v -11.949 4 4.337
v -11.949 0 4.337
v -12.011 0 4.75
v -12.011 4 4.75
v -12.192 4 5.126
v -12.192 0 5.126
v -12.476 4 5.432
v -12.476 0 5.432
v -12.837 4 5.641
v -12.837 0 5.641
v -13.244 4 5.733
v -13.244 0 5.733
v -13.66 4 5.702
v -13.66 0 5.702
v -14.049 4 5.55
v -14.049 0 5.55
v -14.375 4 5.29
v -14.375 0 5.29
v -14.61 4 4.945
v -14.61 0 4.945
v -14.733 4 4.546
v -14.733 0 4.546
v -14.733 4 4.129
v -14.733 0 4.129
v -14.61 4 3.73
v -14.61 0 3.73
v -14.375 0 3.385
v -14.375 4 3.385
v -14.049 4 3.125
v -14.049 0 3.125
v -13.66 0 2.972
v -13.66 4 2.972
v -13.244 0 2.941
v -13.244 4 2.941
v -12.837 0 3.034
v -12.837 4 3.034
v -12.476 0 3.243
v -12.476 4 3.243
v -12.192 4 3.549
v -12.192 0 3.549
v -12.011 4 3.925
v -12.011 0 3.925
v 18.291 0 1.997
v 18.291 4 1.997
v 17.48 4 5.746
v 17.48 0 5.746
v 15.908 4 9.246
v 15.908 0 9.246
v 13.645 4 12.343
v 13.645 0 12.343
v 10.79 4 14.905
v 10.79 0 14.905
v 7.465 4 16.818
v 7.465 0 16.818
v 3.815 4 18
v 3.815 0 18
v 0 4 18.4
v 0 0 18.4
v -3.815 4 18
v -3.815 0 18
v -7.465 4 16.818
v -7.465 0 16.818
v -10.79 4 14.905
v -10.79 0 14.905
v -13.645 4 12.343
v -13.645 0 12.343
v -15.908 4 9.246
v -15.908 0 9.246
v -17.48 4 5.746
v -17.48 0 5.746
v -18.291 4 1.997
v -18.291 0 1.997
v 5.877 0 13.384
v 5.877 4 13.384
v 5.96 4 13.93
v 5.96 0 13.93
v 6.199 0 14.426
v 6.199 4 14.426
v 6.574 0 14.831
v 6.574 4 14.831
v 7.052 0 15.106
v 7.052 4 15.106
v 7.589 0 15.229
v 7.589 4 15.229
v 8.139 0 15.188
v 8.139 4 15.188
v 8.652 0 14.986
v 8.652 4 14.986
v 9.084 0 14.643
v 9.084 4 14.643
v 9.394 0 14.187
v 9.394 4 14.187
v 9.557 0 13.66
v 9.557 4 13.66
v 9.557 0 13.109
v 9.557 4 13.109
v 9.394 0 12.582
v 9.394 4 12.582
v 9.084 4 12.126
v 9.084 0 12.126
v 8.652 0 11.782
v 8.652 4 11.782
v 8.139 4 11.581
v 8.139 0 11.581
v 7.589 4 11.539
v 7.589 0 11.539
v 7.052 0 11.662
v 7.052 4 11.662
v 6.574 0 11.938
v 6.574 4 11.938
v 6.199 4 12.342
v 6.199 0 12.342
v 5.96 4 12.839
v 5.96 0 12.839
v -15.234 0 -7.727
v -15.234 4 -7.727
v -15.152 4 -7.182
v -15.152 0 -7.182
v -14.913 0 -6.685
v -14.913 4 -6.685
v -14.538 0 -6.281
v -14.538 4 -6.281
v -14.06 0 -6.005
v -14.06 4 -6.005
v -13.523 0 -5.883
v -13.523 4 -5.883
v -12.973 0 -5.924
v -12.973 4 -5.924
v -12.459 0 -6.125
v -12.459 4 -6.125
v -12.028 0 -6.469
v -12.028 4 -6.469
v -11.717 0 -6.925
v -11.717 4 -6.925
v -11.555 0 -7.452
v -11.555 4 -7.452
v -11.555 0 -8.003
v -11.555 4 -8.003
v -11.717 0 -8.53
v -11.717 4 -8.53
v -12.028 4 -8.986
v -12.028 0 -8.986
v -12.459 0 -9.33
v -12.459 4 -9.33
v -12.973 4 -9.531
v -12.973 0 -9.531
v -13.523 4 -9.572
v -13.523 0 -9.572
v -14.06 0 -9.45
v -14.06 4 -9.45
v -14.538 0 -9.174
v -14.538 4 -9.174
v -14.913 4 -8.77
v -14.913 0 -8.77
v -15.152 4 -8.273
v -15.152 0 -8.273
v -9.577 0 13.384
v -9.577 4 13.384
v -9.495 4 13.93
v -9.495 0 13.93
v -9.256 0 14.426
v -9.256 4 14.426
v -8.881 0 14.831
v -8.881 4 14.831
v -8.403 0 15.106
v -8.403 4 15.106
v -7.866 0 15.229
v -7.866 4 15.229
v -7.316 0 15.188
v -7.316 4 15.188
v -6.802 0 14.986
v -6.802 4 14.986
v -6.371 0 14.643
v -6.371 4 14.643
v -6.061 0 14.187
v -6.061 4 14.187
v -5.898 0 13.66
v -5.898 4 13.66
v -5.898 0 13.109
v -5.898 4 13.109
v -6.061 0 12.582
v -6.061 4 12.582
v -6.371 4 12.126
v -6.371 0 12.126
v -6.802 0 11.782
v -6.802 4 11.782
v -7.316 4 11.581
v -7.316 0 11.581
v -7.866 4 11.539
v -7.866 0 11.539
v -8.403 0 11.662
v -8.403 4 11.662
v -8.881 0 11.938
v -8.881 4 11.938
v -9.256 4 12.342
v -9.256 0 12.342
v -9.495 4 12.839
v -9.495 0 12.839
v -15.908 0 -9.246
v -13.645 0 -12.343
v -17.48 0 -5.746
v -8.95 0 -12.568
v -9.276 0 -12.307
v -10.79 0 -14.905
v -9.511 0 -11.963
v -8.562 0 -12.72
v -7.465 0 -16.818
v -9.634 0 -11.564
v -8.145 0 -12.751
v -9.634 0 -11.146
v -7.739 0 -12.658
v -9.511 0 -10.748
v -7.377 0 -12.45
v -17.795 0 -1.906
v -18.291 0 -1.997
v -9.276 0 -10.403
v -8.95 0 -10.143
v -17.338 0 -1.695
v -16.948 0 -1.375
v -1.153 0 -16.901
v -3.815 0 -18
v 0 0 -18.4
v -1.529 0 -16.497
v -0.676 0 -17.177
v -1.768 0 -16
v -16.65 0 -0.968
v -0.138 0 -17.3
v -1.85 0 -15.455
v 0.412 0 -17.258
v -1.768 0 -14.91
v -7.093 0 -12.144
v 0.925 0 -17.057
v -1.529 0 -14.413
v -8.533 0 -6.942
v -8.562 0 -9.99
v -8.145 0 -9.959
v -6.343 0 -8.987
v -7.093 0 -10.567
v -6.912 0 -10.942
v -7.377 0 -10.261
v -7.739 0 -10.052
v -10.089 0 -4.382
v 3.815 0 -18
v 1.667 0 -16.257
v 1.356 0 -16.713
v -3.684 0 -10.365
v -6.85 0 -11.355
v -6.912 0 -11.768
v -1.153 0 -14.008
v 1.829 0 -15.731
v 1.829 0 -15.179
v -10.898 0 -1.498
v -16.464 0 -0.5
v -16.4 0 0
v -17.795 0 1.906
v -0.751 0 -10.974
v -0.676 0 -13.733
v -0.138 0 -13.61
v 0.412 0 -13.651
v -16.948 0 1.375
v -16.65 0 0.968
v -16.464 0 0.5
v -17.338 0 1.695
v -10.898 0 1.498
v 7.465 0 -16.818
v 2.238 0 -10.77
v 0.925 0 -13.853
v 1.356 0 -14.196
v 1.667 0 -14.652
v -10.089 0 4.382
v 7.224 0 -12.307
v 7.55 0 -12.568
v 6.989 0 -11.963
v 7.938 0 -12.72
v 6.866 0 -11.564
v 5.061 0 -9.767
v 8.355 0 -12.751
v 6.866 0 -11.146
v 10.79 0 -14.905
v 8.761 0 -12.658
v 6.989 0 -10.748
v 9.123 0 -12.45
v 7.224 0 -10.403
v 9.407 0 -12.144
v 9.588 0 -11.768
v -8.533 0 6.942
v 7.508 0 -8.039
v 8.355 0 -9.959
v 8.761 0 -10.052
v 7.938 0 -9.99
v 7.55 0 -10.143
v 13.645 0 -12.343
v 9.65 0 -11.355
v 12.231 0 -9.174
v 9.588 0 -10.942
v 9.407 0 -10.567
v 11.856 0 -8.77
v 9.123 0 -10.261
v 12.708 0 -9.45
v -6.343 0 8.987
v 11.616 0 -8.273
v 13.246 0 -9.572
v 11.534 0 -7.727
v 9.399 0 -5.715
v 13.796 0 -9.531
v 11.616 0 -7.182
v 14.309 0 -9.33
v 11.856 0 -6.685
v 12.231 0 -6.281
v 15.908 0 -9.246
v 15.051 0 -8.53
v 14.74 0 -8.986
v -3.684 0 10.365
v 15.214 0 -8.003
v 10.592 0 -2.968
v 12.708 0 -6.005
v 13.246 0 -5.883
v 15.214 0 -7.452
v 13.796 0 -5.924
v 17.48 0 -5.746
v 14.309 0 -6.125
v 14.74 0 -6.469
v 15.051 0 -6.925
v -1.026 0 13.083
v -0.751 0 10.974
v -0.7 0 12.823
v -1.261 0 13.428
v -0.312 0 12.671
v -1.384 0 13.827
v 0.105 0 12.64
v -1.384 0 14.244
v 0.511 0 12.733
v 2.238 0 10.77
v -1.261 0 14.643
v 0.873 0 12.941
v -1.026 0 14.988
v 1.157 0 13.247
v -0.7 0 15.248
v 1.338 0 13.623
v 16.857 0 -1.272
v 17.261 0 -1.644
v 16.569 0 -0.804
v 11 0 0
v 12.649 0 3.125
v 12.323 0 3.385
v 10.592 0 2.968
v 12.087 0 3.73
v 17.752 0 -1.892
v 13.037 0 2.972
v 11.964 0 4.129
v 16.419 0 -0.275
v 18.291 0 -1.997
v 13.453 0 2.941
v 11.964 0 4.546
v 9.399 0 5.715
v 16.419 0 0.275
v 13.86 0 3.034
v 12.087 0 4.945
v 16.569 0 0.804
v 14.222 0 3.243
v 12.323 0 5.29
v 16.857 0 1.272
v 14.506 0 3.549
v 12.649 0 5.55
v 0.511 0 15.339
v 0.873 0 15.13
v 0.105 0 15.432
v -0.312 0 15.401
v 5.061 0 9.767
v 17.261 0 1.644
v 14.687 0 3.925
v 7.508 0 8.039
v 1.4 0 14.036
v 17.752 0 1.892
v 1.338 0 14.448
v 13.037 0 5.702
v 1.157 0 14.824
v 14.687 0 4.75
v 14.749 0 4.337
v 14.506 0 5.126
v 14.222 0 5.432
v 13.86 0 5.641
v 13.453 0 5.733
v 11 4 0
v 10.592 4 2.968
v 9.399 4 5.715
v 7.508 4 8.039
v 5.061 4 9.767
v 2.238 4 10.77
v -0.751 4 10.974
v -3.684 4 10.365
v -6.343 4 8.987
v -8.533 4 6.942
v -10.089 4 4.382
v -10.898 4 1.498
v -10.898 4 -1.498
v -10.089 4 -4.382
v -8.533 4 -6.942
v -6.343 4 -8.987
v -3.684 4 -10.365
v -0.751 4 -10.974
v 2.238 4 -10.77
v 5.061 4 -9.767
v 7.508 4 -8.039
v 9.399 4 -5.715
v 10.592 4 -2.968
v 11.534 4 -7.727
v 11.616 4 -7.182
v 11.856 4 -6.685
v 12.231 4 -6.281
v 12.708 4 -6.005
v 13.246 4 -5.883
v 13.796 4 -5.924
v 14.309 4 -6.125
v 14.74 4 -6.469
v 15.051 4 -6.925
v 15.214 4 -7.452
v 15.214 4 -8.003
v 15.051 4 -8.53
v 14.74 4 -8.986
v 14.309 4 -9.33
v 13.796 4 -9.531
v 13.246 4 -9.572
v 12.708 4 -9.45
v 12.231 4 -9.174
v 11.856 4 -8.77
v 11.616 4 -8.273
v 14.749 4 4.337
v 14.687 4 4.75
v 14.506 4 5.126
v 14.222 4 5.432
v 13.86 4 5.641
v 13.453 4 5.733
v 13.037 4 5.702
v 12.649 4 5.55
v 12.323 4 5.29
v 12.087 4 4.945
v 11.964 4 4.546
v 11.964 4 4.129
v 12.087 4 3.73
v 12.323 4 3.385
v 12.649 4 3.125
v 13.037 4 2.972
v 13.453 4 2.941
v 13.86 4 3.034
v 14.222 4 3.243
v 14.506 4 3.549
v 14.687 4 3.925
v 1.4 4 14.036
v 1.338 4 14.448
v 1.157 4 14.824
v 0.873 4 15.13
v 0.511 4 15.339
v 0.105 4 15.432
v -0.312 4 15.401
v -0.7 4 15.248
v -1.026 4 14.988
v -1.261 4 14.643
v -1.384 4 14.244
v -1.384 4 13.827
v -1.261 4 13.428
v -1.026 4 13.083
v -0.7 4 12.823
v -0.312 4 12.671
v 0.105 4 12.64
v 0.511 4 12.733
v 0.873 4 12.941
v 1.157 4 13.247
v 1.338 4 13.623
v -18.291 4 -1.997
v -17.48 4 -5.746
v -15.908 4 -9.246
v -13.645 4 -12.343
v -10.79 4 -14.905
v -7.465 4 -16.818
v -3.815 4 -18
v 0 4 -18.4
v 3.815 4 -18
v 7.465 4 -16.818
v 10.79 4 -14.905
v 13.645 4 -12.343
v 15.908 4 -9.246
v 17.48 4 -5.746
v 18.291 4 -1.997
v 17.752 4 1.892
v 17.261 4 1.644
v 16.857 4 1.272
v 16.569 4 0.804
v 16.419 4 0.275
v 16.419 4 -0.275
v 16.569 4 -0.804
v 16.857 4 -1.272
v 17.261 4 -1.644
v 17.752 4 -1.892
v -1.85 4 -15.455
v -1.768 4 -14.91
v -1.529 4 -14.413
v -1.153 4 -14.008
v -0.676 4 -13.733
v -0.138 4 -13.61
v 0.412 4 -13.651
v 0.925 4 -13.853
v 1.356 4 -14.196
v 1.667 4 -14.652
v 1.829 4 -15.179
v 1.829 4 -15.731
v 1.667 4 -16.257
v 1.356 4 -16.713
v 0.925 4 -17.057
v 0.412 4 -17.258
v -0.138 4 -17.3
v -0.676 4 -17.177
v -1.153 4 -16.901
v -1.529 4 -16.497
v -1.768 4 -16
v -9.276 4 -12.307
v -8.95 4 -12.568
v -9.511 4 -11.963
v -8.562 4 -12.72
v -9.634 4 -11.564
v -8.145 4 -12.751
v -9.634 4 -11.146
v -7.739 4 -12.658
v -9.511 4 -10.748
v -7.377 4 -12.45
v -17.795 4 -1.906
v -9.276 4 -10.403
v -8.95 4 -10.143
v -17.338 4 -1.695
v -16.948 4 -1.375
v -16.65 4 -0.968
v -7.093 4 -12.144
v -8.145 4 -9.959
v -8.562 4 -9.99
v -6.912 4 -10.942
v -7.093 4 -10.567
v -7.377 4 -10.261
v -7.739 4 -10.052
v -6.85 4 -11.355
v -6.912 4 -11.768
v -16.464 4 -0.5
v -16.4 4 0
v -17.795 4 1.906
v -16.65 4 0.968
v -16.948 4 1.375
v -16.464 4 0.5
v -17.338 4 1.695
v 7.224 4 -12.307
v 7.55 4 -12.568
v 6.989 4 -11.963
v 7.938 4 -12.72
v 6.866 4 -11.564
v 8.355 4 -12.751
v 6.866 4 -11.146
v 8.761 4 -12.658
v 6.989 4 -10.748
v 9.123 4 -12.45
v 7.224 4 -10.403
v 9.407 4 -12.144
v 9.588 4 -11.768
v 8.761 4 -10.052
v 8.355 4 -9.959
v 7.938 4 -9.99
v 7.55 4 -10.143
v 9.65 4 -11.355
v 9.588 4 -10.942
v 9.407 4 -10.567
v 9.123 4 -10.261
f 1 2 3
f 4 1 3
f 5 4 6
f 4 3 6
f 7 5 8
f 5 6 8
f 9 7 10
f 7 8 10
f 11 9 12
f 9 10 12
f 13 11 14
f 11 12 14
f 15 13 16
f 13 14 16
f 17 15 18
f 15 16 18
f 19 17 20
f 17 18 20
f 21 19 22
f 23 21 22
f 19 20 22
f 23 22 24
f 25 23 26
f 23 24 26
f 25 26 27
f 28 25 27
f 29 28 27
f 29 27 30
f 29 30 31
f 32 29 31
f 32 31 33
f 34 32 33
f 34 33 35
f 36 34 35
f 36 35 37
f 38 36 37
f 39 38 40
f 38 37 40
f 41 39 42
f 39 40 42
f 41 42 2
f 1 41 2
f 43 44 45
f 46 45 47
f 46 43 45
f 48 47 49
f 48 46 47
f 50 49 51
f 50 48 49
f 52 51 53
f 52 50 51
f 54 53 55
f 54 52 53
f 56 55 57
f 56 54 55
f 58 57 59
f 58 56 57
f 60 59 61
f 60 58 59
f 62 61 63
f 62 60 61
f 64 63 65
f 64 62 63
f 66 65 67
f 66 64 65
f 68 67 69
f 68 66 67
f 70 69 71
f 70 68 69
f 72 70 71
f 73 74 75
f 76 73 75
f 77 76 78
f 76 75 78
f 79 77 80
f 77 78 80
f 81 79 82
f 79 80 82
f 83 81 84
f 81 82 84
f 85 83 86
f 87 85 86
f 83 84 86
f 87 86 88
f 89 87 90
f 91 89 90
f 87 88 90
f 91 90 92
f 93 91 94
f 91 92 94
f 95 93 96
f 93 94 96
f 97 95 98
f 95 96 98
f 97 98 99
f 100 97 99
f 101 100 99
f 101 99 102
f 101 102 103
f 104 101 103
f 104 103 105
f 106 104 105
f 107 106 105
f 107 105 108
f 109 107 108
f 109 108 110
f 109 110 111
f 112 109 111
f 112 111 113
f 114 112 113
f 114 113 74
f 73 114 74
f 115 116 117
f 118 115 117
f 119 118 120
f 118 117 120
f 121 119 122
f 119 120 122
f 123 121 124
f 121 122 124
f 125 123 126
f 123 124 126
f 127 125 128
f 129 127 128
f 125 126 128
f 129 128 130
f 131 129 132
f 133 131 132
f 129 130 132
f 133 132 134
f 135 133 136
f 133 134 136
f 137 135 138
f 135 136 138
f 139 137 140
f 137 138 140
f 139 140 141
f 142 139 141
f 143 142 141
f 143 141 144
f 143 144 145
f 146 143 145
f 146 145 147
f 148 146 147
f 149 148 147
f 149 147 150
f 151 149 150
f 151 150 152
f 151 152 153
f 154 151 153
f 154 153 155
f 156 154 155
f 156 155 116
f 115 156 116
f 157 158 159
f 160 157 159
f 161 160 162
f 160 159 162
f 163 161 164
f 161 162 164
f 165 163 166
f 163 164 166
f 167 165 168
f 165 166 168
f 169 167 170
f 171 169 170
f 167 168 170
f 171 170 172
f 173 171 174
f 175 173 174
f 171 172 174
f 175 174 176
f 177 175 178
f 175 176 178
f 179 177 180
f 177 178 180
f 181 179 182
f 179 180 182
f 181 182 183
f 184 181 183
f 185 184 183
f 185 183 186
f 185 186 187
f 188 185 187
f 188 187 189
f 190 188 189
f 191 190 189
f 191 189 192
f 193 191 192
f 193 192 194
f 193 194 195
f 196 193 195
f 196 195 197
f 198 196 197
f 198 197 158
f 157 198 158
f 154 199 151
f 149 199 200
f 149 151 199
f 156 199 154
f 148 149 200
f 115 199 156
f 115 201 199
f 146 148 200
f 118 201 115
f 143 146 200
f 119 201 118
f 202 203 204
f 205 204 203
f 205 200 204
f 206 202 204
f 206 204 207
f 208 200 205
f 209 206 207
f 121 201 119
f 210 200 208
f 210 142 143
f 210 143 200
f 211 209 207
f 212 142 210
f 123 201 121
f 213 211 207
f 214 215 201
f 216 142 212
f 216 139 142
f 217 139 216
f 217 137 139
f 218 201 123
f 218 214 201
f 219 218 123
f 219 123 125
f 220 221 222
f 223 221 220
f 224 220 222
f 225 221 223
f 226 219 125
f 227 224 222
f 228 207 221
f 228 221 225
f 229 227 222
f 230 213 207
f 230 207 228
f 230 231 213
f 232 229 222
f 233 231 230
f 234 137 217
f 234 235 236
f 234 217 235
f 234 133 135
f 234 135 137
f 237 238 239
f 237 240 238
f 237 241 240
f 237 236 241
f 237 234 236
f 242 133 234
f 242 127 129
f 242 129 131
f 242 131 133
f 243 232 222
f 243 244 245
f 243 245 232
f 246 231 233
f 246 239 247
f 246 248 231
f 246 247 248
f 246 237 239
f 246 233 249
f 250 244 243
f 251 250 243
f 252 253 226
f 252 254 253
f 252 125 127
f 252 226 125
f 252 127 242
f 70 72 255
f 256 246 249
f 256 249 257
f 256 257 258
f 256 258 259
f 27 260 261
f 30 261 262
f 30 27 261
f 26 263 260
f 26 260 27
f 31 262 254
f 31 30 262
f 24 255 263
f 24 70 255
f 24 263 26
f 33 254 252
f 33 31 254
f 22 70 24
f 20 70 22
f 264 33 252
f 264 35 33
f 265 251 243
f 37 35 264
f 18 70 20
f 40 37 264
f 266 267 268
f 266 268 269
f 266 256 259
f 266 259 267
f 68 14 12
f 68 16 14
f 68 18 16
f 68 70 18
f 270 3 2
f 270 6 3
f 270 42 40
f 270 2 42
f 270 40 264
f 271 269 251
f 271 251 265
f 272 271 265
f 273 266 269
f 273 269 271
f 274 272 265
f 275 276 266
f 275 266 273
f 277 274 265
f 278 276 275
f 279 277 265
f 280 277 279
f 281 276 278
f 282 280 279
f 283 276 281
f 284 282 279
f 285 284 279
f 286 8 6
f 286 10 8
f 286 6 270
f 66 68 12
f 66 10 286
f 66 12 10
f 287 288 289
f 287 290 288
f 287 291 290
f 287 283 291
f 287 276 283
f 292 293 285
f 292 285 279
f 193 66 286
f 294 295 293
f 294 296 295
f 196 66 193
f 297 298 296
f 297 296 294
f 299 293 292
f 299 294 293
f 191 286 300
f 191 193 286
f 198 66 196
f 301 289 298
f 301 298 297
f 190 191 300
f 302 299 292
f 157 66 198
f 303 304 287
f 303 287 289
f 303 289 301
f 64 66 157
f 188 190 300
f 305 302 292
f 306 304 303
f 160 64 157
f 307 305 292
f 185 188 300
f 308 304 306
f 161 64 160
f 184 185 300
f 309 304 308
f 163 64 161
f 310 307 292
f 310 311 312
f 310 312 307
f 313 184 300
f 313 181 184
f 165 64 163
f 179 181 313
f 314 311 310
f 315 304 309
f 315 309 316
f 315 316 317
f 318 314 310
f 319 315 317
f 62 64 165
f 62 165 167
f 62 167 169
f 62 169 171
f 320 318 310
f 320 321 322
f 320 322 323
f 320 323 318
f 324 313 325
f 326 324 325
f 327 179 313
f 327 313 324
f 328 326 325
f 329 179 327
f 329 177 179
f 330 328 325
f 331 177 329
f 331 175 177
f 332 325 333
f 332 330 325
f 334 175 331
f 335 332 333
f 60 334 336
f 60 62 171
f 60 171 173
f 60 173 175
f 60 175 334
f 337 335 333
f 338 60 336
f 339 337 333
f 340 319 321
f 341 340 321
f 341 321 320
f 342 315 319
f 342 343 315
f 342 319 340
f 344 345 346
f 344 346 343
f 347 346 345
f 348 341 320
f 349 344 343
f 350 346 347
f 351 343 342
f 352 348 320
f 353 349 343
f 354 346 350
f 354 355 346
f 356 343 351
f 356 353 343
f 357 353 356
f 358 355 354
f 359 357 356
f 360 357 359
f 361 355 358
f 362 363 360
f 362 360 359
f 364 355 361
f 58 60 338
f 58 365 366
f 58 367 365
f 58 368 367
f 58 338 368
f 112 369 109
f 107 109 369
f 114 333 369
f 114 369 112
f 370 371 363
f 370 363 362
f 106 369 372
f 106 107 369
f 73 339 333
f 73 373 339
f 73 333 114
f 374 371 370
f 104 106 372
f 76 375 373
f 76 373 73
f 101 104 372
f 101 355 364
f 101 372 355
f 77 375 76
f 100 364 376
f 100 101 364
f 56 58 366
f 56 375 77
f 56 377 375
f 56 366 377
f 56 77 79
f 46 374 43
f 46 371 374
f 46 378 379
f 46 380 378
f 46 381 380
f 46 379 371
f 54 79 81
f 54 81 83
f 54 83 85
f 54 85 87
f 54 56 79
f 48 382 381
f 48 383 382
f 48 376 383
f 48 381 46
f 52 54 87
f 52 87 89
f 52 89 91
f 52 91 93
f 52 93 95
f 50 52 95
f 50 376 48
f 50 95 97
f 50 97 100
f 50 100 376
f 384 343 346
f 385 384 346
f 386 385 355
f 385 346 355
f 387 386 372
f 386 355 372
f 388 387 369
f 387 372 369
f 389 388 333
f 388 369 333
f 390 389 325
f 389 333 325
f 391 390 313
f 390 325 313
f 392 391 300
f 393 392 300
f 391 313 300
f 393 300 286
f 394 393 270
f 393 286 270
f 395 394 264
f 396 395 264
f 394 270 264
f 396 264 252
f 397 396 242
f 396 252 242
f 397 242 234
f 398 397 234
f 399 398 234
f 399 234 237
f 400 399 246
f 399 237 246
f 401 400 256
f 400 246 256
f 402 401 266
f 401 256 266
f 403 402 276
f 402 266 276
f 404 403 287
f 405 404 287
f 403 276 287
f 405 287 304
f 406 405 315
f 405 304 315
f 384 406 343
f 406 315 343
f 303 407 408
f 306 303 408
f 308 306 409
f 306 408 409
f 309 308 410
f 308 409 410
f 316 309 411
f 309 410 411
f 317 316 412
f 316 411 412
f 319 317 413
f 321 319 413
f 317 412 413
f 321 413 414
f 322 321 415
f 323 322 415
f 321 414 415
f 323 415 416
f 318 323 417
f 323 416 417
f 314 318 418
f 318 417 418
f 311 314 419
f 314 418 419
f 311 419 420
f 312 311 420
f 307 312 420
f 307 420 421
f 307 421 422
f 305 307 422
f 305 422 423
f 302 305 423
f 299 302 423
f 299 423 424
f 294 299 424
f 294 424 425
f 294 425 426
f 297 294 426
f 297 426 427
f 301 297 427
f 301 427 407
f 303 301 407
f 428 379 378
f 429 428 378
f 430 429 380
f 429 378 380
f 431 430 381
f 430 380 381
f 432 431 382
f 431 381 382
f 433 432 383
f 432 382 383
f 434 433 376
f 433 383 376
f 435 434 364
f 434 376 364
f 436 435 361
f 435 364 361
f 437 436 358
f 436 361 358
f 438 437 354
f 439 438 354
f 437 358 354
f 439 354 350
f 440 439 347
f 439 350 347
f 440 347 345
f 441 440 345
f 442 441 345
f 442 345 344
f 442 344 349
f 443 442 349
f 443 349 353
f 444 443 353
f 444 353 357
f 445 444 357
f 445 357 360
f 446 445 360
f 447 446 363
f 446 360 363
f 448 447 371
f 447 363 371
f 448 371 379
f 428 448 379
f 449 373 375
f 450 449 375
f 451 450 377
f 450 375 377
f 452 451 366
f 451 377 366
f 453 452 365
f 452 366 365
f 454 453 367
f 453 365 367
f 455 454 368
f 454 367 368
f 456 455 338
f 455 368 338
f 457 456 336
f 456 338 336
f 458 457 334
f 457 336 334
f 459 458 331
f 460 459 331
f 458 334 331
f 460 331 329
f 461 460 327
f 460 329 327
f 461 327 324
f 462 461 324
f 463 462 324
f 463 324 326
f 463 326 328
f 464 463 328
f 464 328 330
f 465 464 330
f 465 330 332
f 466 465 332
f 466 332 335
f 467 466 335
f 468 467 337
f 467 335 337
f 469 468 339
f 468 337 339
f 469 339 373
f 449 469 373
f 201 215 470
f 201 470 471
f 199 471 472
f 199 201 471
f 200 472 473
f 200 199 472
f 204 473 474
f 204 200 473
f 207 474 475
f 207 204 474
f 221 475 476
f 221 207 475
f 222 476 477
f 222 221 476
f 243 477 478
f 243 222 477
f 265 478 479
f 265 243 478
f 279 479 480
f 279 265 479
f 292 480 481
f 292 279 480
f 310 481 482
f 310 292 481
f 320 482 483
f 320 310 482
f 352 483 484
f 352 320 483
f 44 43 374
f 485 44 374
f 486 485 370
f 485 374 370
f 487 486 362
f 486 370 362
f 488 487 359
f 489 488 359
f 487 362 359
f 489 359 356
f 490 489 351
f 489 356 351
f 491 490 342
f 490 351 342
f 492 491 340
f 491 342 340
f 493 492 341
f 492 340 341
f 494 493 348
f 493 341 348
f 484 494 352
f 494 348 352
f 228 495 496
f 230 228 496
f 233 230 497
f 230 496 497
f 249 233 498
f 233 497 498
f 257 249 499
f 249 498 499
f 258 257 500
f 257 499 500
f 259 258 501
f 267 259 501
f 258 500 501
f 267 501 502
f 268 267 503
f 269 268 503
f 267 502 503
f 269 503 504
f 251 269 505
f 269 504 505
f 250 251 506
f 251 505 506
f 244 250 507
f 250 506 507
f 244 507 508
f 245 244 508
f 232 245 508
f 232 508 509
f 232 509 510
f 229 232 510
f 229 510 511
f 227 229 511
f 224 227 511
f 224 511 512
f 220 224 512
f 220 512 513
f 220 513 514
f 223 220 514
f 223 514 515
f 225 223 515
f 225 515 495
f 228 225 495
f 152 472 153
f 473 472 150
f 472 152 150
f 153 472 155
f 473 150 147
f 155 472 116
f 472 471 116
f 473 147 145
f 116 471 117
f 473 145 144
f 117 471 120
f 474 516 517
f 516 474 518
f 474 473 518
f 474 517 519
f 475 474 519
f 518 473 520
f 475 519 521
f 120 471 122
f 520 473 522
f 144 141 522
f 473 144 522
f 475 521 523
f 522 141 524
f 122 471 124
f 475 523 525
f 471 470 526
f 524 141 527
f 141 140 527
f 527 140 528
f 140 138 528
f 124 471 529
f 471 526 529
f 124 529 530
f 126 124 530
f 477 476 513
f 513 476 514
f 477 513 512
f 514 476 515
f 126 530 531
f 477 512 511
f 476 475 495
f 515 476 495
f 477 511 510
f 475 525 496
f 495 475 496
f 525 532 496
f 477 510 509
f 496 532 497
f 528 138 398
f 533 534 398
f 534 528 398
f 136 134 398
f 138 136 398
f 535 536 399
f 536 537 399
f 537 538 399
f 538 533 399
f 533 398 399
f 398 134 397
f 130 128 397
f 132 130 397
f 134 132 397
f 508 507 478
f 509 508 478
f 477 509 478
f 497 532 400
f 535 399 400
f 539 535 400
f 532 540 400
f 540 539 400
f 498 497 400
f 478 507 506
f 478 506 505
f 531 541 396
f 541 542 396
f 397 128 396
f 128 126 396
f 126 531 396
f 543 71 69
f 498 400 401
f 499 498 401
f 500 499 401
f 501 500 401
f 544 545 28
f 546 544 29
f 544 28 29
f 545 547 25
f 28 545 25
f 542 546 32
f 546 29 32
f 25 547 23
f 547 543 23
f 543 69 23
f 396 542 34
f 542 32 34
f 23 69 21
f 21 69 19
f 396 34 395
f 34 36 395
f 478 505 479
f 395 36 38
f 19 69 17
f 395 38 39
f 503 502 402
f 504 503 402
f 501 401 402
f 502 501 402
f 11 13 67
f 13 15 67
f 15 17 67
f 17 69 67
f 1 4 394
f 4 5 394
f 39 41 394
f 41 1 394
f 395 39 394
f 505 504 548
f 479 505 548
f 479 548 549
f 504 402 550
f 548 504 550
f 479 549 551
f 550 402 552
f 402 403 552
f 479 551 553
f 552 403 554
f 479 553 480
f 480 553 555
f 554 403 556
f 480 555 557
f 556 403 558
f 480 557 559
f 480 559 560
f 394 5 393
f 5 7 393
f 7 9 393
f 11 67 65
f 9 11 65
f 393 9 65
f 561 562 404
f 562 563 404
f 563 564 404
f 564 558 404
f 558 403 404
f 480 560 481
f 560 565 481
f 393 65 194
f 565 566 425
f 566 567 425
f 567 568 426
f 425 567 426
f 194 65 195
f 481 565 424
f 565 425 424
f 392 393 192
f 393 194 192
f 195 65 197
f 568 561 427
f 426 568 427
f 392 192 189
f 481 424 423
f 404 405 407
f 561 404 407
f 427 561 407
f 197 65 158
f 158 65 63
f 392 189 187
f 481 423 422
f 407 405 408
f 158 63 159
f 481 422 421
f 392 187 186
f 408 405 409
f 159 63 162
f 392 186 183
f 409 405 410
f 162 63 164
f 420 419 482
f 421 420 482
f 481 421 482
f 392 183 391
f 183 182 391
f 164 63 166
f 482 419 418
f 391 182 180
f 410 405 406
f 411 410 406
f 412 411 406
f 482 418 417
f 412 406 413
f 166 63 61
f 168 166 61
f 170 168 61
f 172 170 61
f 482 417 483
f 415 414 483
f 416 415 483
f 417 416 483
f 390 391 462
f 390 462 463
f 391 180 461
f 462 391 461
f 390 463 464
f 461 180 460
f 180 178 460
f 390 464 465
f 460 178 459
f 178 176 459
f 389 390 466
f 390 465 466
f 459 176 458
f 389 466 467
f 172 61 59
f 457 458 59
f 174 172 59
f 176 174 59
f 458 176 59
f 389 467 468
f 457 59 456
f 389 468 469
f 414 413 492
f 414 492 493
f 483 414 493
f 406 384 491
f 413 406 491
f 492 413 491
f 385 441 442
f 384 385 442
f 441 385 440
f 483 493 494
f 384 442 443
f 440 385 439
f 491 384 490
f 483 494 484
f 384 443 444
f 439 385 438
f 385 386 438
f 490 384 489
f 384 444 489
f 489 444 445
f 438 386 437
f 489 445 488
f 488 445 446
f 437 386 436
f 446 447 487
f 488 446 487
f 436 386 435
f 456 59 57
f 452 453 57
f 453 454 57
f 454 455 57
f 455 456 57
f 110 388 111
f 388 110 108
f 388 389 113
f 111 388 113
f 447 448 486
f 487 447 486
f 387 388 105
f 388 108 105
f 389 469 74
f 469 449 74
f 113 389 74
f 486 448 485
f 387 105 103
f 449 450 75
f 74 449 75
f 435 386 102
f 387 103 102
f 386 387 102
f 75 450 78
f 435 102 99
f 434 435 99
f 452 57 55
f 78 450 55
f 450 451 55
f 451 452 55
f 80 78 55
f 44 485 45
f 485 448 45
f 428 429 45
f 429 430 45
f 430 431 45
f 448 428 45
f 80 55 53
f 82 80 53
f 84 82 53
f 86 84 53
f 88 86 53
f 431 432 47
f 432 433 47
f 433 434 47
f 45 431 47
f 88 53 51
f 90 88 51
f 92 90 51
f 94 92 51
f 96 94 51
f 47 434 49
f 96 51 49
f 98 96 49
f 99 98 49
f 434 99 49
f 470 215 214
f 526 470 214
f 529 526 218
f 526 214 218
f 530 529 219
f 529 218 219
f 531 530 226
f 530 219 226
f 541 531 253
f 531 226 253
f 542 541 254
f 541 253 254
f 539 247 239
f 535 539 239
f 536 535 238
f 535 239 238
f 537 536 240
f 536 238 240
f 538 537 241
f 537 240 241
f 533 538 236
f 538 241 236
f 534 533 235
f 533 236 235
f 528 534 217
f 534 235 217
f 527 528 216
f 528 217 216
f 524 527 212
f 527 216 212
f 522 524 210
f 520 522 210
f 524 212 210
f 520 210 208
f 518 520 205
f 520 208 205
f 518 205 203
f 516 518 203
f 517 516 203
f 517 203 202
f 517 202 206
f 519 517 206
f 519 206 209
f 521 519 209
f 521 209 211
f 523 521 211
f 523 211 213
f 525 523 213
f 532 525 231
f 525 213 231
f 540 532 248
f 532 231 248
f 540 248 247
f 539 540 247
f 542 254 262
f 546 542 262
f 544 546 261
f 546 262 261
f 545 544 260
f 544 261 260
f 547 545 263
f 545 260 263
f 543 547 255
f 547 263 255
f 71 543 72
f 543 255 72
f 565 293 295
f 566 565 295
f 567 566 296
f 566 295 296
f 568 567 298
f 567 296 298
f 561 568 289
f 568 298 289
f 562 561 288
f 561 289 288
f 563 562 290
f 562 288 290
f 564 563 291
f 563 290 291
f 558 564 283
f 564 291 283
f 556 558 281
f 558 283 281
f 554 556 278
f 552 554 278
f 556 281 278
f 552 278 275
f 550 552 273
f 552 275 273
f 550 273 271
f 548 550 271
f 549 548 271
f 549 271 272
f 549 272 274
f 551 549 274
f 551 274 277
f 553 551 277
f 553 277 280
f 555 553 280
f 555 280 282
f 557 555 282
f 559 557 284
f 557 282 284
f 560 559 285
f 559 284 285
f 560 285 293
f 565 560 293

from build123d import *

# Parameters (mm, degrees)
F0_R     = 18.4
F0_R_2   = 1.4
F0_R_3   = 11
F1_DEPTH = 4
F2_R     = 1.85
F3_DEPTH = 25
F5_DEPTH = 25


with BuildPart() as f1:
    # F0 (on Front) → F1 (new body)
    with BuildSketch(Plane.XZ):
        Circle(F0_R)
        with Locations((-8.25, -11.3551508439)):
            Circle(F0_R_2, mode=Mode.SUBTRACT)
        with Locations((8.25, -11.3551508439)):
            Circle(F0_R_2, mode=Mode.SUBTRACT)
        with Locations((-13.3487804072, 4.337281675)):
            Circle(F0_R_2, mode=Mode.SUBTRACT)
        Circle(F0_R_3, mode=Mode.SUBTRACT)
        with Locations((13.3487804072, 4.337281675)):
            Circle(F0_R_2, mode=Mode.SUBTRACT)
        with Locations((0, 14.0357383378)):
            Circle(F0_R_2, mode=Mode.SUBTRACT)
    extrude(amount=-F1_DEPTH)

    # F2 (on face) → F3 (cut)
    with BuildSketch(Plane(origin=(0, 4, 0), x_dir=(-1, 0, 0), z_dir=(0, 1, 0))):
        with Locations((0, -15.4548132206)):
            Circle(F2_R)
        with Locations((13.3842608598, -7.7274066103)):
            Circle(F2_R)
        with Locations((-13.3842608598, -7.7274066103)):
            Circle(F2_R)
        with Locations((-7.7274066103, 13.3842608598)):
            Circle(F2_R)
        with Locations((7.7274066103, 13.3842608598)):
            Circle(F2_R)
    extrude(amount=-F3_DEPTH, mode=Mode.SUBTRACT)

    # F4 (on face) → F5 (cut)
    with BuildSketch(Plane.XZ):
        with BuildLine():
            ThreePointArc((-18.2913043478, -1.9970441295), (-16.9478651398, -1.3752470134), (-16.4, 0))
            ThreePointArc((-16.4, 0), (-16.9478651398, 1.3752470134), (-18.2913043478, 1.9970441295))
            ThreePointArc((-18.2913043478, 1.9970441295), (-18.4, 0), (-18.2913043478, -1.9970441295))
        make_face()
        with BuildLine():
            ThreePointArc((18.4, 0), (18.3728059915, 1), (18.2913043478, 1.9970441295))
            ThreePointArc((18.2913043478, 1.9970441295), (16.4, 0), (18.2913043478, -1.9970441295))
            ThreePointArc((18.2913043478, -1.9970441295), (18.3728059915, -1), (18.4, 0))
        make_face()
    extrude(amount=-F5_DEPTH, mode=Mode.SUBTRACT)


solid = f1.part
